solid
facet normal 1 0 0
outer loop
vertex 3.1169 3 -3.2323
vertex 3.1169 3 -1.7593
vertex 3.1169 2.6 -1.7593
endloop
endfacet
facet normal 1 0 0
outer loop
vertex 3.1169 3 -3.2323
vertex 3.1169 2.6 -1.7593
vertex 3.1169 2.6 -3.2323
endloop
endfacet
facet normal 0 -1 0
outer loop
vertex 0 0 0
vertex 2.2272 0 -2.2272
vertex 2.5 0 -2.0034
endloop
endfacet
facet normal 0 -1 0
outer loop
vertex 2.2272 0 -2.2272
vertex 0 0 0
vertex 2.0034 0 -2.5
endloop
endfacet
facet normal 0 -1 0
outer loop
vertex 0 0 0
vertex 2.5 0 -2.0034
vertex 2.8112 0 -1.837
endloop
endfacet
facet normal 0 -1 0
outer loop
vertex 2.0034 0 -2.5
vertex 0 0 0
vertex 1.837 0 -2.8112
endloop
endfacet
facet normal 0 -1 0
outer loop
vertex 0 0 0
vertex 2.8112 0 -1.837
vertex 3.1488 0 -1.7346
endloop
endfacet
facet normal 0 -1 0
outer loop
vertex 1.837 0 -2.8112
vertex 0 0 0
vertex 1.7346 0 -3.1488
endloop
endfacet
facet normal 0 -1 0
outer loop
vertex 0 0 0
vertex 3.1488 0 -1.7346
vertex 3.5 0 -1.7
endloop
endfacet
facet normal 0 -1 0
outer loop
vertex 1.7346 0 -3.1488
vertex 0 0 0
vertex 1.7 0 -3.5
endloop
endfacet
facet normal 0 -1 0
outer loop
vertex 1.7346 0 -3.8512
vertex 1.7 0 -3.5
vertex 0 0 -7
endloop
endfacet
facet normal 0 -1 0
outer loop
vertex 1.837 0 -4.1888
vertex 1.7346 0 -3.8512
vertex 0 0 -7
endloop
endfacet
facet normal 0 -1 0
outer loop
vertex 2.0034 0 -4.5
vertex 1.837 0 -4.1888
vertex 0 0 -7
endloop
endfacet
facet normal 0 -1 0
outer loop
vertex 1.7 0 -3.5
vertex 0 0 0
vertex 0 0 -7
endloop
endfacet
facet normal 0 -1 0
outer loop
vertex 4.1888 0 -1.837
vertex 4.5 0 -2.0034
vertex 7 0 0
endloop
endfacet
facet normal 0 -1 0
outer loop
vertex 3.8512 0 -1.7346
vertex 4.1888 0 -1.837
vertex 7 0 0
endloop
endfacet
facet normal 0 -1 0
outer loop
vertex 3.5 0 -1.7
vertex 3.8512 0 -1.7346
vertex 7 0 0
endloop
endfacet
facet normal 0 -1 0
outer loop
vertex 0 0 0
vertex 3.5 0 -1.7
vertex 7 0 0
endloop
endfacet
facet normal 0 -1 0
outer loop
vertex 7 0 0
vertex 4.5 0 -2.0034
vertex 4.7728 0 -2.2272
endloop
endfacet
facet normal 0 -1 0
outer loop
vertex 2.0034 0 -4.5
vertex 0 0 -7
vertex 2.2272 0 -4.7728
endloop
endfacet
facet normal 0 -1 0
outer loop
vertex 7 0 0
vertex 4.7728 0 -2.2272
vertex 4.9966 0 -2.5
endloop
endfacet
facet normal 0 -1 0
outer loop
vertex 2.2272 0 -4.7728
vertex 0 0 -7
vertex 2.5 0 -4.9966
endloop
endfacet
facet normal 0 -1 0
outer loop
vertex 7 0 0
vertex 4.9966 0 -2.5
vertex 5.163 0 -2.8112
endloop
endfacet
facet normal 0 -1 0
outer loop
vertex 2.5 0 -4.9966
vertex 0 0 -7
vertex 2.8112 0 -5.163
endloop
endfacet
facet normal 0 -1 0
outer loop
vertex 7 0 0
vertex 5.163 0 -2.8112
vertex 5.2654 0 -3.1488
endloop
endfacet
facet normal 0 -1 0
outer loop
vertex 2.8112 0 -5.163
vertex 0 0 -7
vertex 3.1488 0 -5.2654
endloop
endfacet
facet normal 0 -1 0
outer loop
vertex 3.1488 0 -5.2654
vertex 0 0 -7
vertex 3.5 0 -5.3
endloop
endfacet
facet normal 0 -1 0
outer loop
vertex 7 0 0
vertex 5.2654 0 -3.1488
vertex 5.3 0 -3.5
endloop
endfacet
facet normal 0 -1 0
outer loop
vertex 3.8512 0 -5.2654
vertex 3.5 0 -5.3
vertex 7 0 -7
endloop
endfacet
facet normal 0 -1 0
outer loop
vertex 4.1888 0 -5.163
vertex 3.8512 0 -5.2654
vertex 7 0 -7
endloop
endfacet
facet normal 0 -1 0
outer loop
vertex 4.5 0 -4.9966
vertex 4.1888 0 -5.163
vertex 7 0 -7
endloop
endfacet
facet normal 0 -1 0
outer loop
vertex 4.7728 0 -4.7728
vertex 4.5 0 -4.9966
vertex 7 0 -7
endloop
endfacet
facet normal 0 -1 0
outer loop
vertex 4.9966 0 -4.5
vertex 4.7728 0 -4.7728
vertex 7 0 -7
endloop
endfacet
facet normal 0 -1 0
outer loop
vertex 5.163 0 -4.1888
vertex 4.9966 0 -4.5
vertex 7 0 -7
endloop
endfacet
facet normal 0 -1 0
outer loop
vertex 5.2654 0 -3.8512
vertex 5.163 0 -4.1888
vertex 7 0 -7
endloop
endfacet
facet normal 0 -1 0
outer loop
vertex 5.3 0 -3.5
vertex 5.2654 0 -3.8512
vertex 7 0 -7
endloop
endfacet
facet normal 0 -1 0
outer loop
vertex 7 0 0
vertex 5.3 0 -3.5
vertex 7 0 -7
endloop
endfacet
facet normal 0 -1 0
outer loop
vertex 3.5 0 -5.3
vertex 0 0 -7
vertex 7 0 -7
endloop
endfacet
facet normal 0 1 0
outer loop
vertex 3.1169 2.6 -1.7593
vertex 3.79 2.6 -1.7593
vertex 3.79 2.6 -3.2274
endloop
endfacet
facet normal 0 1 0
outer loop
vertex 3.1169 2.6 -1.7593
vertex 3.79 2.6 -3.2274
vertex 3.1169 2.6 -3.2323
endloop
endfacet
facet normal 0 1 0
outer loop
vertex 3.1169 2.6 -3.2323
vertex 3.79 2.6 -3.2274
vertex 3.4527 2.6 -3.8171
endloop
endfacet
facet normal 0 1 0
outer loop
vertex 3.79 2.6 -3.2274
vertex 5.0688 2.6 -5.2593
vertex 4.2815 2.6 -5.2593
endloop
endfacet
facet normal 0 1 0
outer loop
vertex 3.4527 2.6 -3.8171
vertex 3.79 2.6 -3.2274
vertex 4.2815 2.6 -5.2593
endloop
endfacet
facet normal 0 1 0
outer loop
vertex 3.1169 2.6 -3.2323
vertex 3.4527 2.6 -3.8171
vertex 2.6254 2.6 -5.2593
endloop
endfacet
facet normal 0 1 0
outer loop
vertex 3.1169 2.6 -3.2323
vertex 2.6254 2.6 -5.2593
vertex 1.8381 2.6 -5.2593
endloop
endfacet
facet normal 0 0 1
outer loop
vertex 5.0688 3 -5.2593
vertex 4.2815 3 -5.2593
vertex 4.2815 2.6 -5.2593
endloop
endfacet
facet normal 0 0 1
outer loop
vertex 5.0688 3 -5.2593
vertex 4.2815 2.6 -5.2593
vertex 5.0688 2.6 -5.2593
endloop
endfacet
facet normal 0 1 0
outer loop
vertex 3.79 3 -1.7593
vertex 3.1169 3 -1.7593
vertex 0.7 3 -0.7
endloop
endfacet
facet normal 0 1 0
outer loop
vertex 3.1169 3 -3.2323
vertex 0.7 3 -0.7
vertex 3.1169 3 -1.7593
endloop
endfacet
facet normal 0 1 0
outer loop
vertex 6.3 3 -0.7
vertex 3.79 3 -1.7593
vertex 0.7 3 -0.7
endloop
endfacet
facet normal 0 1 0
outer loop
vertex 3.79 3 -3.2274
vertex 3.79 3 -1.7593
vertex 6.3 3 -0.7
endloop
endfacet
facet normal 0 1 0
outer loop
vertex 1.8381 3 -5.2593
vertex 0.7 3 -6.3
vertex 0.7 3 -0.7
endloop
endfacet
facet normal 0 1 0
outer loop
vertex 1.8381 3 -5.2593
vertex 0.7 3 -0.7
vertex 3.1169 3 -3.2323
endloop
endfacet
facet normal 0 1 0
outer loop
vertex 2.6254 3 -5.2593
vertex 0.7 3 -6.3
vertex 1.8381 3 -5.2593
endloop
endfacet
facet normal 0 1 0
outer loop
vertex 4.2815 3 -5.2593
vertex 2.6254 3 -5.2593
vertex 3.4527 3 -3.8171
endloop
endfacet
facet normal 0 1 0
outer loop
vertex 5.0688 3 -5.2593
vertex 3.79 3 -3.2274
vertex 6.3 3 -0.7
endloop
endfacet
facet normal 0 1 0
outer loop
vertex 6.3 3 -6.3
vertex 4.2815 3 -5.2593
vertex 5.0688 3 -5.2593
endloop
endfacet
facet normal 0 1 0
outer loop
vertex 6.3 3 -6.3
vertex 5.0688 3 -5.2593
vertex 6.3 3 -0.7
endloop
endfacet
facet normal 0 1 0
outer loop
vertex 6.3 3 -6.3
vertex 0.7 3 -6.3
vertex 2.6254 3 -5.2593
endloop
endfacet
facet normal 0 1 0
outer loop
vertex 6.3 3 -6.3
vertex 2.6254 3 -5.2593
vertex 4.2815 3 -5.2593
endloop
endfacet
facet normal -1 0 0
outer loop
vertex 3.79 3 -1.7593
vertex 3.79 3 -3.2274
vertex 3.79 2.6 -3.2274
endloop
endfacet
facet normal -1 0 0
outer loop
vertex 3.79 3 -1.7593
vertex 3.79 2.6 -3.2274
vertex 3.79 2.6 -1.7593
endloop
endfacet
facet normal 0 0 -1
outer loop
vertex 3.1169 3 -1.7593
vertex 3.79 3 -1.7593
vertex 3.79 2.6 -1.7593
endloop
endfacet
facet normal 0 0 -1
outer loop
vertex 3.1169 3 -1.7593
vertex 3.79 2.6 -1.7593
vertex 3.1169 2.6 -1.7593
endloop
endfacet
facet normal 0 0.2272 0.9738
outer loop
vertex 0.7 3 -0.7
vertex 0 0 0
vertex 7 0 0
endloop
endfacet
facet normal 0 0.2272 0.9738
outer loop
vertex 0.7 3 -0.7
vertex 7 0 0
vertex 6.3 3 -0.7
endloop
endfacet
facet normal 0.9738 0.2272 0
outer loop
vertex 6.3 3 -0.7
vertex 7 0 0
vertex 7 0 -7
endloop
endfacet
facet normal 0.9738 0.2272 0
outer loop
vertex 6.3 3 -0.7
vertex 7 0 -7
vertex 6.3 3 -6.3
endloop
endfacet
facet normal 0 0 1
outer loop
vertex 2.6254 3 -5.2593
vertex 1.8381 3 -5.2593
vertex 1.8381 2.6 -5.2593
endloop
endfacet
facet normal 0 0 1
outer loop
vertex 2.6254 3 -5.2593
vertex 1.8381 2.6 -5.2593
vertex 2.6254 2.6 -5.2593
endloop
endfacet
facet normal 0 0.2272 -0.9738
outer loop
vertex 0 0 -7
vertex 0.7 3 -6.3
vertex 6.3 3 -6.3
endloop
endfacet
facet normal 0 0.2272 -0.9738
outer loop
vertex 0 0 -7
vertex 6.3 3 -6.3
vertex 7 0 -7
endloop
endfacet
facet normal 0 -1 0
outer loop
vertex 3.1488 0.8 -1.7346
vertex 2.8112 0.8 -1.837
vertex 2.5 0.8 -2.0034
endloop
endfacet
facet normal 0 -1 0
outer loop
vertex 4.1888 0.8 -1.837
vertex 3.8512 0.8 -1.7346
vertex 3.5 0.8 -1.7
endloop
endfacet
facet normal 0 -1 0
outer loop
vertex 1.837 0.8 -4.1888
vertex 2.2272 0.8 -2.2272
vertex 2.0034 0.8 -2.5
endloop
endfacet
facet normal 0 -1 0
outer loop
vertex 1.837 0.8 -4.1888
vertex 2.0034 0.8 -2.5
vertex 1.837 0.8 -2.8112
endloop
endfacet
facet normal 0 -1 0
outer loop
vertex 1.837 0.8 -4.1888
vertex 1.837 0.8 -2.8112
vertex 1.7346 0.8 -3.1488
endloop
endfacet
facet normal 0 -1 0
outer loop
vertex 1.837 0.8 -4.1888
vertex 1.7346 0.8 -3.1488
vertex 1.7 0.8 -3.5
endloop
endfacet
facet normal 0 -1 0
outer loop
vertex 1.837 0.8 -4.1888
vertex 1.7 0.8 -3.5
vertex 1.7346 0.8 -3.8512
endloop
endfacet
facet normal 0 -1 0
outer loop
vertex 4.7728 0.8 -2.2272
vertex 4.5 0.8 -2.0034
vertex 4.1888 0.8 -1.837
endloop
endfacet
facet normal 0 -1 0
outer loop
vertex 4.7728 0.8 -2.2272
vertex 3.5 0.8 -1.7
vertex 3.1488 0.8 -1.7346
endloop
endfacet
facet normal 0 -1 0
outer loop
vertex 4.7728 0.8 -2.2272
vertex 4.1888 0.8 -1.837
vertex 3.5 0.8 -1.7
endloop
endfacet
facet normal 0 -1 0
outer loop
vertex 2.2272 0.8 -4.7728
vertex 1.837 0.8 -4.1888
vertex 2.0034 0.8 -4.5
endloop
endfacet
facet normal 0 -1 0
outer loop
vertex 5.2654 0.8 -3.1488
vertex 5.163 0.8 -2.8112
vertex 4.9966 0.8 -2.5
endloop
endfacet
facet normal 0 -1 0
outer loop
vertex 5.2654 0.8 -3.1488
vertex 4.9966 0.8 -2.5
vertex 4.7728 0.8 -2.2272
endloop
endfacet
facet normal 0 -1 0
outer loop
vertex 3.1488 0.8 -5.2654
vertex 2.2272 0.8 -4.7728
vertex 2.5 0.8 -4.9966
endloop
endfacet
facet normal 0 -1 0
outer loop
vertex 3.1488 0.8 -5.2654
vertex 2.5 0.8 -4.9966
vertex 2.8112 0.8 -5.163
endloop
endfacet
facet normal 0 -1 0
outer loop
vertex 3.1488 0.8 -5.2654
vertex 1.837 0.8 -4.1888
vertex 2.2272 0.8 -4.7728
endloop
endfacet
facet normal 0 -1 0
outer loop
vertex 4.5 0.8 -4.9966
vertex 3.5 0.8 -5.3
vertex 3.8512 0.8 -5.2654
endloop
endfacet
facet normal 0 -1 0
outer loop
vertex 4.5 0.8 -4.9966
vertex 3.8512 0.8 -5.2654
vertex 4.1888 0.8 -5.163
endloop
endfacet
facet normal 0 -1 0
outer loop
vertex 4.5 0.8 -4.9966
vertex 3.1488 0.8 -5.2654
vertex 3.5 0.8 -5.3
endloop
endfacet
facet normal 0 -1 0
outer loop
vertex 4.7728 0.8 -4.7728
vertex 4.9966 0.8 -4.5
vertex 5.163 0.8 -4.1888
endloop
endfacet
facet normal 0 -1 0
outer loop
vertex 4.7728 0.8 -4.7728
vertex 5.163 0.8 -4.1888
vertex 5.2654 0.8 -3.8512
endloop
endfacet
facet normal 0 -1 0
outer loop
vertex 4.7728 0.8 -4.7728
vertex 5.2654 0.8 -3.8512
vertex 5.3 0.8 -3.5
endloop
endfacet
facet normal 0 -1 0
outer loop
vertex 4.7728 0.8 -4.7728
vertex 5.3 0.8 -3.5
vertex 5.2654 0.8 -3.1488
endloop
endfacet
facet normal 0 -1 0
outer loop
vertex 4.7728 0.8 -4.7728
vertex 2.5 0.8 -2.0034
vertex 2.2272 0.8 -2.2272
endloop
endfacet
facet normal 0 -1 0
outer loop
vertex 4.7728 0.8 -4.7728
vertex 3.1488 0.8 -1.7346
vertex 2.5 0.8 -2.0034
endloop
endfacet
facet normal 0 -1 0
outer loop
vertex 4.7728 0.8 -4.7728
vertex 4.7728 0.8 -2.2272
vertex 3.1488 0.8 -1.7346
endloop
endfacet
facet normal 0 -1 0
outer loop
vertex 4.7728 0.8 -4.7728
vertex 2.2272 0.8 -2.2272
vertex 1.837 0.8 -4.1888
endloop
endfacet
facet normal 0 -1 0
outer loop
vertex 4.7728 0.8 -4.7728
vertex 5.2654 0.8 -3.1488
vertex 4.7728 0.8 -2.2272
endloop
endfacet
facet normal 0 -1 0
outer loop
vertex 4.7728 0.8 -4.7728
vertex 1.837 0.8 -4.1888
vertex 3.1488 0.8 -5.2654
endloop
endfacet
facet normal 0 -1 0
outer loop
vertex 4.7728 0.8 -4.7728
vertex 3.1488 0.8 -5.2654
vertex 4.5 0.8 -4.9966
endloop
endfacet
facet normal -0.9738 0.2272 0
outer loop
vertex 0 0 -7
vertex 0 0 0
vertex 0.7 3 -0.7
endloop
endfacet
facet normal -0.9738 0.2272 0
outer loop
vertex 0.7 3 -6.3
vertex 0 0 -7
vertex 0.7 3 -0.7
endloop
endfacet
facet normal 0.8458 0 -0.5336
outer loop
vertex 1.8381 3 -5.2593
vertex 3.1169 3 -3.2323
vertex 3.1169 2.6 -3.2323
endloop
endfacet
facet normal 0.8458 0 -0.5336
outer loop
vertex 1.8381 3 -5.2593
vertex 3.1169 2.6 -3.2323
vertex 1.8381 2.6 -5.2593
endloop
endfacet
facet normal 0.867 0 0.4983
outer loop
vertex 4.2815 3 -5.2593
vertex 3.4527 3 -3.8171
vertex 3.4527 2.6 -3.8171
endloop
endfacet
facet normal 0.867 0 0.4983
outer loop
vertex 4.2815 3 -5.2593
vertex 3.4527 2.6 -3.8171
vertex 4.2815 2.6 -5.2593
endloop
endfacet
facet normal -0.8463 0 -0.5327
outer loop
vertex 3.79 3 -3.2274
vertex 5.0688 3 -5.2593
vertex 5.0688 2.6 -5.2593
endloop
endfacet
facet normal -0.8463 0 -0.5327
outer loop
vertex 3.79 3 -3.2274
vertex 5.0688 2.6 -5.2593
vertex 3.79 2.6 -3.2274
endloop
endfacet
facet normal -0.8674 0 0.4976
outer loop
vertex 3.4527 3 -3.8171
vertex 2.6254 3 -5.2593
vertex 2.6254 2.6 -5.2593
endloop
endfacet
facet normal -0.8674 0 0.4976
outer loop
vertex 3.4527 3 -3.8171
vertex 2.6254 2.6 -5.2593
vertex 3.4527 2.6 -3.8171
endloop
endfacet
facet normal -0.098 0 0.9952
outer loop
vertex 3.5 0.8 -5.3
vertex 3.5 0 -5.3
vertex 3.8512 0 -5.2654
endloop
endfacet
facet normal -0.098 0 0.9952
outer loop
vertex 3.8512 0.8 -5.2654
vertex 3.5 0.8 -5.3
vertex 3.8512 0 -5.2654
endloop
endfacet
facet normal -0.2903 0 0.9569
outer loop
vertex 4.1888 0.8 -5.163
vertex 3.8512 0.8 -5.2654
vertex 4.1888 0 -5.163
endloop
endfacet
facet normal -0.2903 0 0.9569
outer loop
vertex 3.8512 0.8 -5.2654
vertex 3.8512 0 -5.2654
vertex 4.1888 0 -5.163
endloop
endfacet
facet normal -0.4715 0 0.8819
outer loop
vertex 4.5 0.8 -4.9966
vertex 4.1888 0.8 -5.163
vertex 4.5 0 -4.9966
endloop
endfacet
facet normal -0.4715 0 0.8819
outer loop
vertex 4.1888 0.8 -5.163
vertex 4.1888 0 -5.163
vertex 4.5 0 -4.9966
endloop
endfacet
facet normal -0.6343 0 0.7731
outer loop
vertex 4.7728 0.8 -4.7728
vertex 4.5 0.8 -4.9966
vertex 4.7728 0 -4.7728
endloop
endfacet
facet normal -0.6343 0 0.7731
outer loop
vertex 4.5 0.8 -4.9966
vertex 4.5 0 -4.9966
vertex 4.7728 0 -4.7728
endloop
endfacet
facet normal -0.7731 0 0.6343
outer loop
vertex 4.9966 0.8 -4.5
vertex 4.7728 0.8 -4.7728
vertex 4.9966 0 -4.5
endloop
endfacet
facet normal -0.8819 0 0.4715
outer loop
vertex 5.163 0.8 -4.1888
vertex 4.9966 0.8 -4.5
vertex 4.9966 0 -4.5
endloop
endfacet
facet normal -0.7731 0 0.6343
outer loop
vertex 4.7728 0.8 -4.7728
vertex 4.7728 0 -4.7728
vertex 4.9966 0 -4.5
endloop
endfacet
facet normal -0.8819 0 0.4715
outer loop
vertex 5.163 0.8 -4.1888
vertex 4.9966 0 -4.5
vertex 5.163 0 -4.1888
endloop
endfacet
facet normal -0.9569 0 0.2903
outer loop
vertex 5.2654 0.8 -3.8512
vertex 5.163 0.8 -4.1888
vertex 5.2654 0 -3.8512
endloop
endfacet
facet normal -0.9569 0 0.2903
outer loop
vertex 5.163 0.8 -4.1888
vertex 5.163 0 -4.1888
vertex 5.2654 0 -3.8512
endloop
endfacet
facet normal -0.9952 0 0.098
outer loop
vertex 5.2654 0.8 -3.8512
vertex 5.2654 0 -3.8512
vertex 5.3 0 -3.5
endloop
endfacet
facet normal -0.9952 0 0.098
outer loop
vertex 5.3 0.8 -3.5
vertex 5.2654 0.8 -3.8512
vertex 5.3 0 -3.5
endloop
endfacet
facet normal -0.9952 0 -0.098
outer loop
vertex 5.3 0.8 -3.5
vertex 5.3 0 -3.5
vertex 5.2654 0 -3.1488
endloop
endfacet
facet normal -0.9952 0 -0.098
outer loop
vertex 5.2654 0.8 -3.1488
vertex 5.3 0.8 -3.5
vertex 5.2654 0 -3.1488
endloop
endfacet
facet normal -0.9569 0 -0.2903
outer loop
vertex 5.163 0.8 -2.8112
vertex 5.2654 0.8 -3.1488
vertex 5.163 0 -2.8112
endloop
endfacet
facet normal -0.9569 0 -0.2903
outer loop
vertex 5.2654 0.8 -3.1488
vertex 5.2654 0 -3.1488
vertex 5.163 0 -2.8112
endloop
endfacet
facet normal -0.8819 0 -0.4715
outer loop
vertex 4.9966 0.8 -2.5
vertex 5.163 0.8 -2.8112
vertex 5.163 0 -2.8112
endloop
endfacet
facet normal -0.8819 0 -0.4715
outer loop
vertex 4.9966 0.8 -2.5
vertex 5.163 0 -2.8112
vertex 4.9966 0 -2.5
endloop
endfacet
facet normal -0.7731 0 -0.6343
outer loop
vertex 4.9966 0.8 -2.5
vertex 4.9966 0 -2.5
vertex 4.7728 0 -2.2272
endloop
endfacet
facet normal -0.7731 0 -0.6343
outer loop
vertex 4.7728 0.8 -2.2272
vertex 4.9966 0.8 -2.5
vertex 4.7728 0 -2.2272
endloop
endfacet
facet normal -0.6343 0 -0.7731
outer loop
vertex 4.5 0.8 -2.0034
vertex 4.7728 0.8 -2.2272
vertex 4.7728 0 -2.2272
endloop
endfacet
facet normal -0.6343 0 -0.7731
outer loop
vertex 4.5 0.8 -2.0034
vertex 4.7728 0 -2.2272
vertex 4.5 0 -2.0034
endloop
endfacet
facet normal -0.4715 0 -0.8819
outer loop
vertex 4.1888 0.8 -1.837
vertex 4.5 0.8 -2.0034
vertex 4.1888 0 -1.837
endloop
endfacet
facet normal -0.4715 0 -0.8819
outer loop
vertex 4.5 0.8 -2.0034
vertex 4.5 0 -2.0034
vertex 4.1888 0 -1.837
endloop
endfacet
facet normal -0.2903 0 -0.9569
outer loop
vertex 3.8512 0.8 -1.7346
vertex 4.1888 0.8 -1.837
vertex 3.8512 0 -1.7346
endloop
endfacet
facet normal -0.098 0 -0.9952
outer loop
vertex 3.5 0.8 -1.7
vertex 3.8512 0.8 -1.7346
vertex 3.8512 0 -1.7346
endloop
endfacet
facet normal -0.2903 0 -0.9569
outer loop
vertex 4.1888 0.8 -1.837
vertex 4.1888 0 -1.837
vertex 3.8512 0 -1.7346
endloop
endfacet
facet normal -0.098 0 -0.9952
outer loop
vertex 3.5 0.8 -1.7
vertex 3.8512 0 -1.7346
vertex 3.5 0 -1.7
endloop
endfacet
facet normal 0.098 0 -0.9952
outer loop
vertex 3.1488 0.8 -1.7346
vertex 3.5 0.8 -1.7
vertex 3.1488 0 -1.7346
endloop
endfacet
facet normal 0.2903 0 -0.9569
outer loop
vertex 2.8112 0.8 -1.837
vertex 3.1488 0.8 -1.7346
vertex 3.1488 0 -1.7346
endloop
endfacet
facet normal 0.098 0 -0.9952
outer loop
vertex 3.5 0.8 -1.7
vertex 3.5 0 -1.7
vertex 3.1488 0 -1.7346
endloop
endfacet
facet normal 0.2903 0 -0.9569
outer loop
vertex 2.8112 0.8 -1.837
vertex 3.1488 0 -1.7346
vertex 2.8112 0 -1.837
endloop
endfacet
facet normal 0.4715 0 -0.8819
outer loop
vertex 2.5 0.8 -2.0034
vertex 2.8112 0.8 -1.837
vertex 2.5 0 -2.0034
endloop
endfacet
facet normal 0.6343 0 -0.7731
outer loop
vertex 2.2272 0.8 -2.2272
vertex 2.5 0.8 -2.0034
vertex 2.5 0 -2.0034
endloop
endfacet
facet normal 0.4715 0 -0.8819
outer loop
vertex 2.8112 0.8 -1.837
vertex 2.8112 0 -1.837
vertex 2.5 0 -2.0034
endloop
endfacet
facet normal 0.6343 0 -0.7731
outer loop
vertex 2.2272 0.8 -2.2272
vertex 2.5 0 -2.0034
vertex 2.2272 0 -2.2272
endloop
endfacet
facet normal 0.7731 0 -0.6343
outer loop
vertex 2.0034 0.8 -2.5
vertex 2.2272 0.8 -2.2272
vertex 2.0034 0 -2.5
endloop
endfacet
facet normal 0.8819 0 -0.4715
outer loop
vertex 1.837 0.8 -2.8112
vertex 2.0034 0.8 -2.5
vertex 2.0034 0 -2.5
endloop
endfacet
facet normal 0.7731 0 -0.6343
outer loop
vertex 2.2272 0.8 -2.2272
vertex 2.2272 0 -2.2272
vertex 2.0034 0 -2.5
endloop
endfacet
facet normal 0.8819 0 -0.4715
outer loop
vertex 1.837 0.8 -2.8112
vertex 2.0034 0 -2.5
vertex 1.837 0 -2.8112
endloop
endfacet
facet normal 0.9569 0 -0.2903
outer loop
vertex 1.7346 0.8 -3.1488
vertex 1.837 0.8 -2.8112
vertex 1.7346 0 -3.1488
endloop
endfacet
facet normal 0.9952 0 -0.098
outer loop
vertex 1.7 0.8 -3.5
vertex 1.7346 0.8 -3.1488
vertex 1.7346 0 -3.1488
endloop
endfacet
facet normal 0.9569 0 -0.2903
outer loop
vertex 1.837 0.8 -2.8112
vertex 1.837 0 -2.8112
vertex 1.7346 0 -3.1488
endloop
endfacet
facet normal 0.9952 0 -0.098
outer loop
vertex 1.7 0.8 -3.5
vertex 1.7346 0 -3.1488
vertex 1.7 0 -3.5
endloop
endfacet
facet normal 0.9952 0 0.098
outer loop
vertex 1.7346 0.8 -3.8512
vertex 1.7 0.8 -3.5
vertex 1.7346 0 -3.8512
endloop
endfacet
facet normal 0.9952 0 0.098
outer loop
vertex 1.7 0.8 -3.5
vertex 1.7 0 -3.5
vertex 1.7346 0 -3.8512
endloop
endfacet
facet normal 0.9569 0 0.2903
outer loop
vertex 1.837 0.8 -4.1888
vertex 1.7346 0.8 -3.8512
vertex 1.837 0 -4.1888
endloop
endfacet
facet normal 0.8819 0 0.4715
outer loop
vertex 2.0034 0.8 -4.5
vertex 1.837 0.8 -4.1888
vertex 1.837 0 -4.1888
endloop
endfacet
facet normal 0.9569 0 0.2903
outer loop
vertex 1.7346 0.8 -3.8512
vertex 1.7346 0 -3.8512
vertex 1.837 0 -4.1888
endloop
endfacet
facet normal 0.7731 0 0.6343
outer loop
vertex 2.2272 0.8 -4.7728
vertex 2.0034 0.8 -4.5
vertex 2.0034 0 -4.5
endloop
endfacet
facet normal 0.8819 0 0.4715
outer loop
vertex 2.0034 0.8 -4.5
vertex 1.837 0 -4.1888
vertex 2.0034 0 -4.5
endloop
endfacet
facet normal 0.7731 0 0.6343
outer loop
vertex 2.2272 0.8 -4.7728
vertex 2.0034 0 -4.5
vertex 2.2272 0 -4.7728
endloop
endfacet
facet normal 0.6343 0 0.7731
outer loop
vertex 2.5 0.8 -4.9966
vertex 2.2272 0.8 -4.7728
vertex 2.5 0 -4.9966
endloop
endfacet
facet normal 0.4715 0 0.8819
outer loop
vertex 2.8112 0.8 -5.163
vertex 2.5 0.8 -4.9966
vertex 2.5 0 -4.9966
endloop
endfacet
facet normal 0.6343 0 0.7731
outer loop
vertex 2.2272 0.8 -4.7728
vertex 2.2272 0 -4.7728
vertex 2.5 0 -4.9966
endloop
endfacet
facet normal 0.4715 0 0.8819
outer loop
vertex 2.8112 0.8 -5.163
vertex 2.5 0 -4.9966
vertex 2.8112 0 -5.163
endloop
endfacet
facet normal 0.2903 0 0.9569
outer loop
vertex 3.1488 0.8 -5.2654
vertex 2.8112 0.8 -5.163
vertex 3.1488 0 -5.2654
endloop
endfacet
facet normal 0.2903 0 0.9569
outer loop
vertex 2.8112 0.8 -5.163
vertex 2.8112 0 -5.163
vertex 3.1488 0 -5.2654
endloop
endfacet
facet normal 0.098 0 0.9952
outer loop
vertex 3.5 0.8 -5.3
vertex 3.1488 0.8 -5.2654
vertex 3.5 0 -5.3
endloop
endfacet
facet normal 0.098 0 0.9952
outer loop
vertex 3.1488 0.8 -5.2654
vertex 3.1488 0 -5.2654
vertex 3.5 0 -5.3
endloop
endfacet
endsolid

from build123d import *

# Parameters (mm, degrees)
SKETCH1_W           = 7
SKETCH1_H           = 7
BOSS_EXTRUDE1_DEPTH = 3
CUT_EXTRUDE1_DEPTH  = 7
CUT_EXTRUDE2_DEPTH  = 11
SKETCH4_R           = 1.8
CUT_EXTRUDE3_DEPTH  = 0.8
CUT_EXTRUDE4_DEPTH  = 0.4


with BuildPart() as part:
    # Sketch1 → Boss-Extrude1 (new body)
    with BuildSketch(Plane(origin=(0, 0, 0), x_dir=(1, 0, 0), z_dir=(0, 1, 0))):
        with Locations((3.5, 3.5)):
            Rectangle(SKETCH1_W, SKETCH1_H)
    extrude(amount=BOSS_EXTRUDE1_DEPTH)

    # Sketch2 → Cut-Extrude1 (cut)
    with BuildSketch(Plane.XY):
        Polygon((0, 0), (0.7, 3), (0, 3), align=None)
        Polygon((7, 0), (6.3, 3), (7, 3), align=None)
    extrude(amount=-CUT_EXTRUDE1_DEPTH, mode=Mode.SUBTRACT)

    # Sketch3 → Cut-Extrude2 (cut)
    with BuildSketch(Plane(origin=(0, 0, 0), x_dir=(0, 0, -1), z_dir=(1, 0, 0))):
        Polygon((0, 0), (0.7, 3), (0, 3), align=None)
        Polygon((7, 3), (6.3, 3), (7, 0), align=None)
    extrude(amount=CUT_EXTRUDE2_DEPTH, mode=Mode.SUBTRACT)

    # Sketch4 → Cut-Extrude3 (cut)
    with BuildSketch(Plane.XZ):
        with Locations(Location((3.5, -3.5, 0), (0, 0, 270))):
            Circle(SKETCH4_R)
    extrude(amount=-CUT_EXTRUDE3_DEPTH, mode=Mode.SUBTRACT)

    # Sketch5 → Cut-Extrude4 (cut)
    with BuildSketch(Plane(origin=(0, 3, 0), x_dir=(1, 0, 0), z_dir=(0, 1, 0))):
        Polygon((3.116897122, 1.759282352), (3.116897122, 3.232339243), (1.838050969, 5.259282352), (2.625410744, 5.259282352), (3.452734462, 3.81707482), (4.281460424, 5.259282352), (5.068820199, 5.259282352), (3.789974045, 3.22743139), (3.789974045, 1.759282352), align=None)
    extrude(amount=-CUT_EXTRUDE4_DEPTH, mode=Mode.SUBTRACT)


solid = part.part
